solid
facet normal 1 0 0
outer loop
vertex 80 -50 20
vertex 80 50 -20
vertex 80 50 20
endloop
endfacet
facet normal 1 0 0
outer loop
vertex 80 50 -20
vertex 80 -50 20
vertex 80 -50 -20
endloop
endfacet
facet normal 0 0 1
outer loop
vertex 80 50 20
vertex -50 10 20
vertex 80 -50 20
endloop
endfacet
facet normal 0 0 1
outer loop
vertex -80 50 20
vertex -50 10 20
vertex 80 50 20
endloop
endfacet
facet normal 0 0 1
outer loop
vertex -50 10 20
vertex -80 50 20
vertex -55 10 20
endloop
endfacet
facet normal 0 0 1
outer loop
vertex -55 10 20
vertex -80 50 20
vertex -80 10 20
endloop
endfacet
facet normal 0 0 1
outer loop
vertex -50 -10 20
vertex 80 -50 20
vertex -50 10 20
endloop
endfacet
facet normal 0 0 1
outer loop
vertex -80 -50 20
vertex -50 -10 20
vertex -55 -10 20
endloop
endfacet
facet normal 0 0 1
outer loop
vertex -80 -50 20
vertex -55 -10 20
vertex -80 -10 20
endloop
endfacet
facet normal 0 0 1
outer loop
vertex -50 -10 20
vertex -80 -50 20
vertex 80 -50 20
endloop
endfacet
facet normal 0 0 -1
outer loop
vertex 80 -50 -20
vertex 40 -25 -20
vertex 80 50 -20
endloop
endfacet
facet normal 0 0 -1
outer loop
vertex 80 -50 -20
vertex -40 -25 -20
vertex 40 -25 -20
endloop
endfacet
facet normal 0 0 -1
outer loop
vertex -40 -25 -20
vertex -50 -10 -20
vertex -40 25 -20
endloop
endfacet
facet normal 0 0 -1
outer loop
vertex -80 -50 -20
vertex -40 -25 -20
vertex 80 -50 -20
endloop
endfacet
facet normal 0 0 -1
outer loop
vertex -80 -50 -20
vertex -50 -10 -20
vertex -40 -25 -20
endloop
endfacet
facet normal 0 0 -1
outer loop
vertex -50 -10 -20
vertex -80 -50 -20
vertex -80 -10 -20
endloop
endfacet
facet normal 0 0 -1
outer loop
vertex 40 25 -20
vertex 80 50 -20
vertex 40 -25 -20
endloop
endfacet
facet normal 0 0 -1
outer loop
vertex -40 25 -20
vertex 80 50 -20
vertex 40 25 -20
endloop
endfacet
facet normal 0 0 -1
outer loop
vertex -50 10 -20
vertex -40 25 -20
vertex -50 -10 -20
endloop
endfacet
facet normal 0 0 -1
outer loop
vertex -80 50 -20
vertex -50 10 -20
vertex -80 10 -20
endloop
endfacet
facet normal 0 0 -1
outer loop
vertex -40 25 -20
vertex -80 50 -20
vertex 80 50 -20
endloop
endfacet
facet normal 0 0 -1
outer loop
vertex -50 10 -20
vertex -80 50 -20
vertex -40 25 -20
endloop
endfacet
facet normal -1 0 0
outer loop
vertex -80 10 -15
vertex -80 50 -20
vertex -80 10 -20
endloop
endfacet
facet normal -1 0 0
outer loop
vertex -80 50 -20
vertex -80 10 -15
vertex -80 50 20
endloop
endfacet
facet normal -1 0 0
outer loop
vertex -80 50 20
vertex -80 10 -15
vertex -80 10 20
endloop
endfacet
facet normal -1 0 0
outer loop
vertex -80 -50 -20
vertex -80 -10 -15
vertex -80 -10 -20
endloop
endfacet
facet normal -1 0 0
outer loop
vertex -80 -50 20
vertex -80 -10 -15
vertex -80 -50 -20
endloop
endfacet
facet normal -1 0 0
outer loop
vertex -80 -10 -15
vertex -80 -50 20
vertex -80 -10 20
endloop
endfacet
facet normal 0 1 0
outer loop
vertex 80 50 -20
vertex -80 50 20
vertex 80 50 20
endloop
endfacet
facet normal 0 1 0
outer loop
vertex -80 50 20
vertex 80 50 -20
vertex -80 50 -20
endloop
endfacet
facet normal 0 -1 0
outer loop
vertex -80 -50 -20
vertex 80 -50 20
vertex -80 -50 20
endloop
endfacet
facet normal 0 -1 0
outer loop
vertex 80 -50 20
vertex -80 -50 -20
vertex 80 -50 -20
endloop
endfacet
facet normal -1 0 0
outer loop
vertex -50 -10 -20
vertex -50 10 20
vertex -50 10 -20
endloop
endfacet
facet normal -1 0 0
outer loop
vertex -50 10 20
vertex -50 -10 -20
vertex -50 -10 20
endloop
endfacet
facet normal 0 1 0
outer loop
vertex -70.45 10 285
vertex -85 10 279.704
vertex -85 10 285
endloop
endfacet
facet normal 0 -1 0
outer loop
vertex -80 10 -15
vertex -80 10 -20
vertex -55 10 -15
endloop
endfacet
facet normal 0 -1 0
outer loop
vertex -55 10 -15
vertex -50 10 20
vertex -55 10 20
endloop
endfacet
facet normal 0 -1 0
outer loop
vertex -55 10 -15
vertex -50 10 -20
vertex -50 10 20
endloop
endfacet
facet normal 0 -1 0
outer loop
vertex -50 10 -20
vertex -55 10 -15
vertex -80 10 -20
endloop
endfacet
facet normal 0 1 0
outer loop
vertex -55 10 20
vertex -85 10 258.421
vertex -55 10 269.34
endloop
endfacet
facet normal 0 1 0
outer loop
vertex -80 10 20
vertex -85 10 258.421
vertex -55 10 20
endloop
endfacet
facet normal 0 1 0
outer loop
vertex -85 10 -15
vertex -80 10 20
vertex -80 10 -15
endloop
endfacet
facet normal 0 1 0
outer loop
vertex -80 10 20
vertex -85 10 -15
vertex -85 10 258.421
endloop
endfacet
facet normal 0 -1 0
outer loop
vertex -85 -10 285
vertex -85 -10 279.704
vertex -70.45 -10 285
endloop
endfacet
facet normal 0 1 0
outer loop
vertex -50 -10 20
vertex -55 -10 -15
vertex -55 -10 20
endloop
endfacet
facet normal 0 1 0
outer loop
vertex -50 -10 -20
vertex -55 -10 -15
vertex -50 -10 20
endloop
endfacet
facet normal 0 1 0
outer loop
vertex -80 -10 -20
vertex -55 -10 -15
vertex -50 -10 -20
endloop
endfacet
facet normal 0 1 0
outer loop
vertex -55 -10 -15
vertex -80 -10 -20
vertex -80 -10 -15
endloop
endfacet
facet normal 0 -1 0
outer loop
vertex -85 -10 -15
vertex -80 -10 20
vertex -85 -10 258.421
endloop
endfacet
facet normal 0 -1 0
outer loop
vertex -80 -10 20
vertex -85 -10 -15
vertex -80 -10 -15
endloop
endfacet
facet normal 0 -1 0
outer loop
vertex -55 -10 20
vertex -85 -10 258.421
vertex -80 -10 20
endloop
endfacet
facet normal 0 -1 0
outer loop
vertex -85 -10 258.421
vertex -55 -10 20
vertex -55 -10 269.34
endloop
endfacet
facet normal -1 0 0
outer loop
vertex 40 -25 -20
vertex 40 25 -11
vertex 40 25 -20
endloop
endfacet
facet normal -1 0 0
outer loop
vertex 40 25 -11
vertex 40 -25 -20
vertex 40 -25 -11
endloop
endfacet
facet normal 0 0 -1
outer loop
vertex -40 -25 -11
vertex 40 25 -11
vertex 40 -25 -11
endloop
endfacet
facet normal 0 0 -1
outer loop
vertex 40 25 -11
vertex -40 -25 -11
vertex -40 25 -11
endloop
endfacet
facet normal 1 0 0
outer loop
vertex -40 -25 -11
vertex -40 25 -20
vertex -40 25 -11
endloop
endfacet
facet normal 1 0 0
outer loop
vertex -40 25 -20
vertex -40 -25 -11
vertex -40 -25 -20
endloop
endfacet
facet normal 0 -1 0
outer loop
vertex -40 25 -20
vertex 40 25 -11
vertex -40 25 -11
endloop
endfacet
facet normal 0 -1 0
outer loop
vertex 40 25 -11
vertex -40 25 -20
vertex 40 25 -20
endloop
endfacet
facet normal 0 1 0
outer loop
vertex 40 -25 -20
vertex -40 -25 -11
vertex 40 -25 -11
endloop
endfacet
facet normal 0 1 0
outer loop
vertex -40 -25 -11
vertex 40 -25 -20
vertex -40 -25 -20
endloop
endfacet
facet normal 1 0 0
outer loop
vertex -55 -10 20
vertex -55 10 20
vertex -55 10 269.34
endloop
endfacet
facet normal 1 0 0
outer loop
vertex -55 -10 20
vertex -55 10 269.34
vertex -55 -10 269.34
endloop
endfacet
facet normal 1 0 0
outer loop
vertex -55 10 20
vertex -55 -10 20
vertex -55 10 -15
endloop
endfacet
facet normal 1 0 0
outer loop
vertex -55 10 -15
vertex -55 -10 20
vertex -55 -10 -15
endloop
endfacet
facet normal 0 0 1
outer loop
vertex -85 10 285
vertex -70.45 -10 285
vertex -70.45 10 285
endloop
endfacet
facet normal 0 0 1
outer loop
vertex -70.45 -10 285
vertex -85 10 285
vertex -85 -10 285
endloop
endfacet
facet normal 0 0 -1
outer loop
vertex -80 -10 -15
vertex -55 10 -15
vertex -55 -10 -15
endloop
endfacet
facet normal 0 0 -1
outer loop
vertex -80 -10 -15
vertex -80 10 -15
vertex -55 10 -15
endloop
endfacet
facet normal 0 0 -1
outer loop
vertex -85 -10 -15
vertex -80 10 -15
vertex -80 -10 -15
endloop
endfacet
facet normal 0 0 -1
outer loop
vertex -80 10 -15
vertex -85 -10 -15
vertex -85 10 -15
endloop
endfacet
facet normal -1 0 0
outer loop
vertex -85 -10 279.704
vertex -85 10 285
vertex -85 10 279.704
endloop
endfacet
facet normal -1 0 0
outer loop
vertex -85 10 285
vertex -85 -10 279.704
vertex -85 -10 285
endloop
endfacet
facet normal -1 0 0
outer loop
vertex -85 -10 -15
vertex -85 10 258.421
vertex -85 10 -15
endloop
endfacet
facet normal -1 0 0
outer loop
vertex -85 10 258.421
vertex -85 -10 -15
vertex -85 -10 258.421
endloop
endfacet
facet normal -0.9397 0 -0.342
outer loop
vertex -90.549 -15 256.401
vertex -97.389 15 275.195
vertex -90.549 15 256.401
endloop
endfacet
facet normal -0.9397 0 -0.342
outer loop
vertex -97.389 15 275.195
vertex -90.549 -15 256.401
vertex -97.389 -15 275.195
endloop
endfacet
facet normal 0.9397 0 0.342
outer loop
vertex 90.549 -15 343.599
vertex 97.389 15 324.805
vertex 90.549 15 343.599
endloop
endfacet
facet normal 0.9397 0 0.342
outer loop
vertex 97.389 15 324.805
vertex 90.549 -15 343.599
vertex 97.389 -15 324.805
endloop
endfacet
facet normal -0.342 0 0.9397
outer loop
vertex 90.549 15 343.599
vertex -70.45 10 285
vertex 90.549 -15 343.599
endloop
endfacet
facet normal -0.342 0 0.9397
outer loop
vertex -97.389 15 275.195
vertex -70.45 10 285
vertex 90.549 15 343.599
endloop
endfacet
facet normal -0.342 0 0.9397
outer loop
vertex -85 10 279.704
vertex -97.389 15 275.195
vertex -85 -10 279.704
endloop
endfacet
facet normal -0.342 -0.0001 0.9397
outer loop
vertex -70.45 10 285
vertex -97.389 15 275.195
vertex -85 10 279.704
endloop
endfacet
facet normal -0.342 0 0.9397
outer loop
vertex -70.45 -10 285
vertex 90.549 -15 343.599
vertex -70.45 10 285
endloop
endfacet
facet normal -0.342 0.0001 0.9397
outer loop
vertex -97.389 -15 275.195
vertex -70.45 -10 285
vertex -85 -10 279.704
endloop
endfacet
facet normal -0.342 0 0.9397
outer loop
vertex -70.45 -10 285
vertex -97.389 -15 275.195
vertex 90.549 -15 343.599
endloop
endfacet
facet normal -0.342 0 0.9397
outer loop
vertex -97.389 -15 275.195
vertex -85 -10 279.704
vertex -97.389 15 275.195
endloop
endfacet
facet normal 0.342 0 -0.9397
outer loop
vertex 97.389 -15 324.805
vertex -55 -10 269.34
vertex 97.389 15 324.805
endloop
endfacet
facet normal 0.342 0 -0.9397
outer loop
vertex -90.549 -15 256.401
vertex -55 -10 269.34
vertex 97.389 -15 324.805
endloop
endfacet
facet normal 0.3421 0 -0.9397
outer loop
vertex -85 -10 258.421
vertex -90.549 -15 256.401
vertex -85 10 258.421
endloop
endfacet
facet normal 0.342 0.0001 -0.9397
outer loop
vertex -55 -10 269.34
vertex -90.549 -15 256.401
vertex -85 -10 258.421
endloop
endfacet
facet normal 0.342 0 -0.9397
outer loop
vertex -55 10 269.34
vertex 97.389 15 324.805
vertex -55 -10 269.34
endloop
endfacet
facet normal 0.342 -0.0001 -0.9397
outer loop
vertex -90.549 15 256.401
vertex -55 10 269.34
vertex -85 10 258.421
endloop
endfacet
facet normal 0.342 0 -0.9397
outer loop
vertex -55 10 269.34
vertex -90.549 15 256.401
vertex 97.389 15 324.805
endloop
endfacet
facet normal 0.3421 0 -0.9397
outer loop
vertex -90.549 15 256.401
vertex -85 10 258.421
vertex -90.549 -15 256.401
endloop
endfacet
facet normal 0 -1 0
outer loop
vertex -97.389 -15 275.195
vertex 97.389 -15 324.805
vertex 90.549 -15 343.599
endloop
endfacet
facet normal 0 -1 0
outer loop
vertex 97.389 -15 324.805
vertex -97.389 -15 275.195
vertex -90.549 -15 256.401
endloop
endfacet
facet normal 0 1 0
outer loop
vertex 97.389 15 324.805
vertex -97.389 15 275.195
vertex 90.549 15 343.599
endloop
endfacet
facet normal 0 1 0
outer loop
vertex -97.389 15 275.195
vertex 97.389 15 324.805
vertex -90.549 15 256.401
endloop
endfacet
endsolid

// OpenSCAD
// Generated by SolidPython 1.1.1 on 2021-04-14 21:12:52


union() {
	difference() {
		cube(center = true, size = [160, 100, 40]);
		translate(v = [-80.0000000000, 0, 0]) {
			cube(center = true, size = [60, 20, 41]);
		}
		translate(v = [0, 0, -21.0000000000]) {
			cube(center = true, size = [80, 50, 20]);
		}
	}
	translate(v = [0, 0, 135.0000000000]) {
		translate(v = [-70.0000000000, 0, 0]) {
			cube(center = true, size = [30, 20, 300]);
		}
	}
	translate(v = [0, 0, 300]) {
		rotate(a = [0, -20, 0]) {
			cube(center = true, size = [200, 30, 20]);
		}
	}
}
/***********************************************
*********      SolidPython code:      **********
************************************************
 
import solid
import solid.utils

BASE_DIMENSIONS = [
    160, # X value
    100, # Y value
    40   # Z value
]

POLE_DIMENSIONS = [
    30,
    20,
    300
]

TOP_DIMENSIONS = [
    200,
    30,
    20
]

BOTTOM_HOLE_DIMENSIONS = [
    80,
    50,
    20
]

def make_shade():
    pass

def make_top():
    top = solid.cube(TOP_DIMENSIONS, center=True)
    top = solid.utils.rotate([0, -20, 0])(top)
    top = solid.utils.up(
        POLE_DIMENSIONS[2]
    )(top)
    return top

def make_pole():
    pole = solid.cube(POLE_DIMENSIONS, center=True)
    pole = solid.utils.left((BASE_DIMENSIONS[0]/2) - 10)(pole)
    pole = solid.utils.up((((POLE_DIMENSIONS[2]/2) - BASE_DIMENSIONS[2]/2)) + 5)(pole)
    return pole

def make_base():
    base = solid.cube(BASE_DIMENSIONS, center=True)
    pole_hole = solid.cube([POLE_DIMENSIONS[0]*2, POLE_DIMENSIONS[1], BASE_DIMENSIONS[2]+1], center=True)
    pole_hole = solid.utils.left(BASE_DIMENSIONS[0]/2)(pole_hole)
    bottom_hole = solid.cube(BOTTOM_HOLE_DIMENSIONS, center=True)
    bottom_hole = solid.utils.down(BASE_DIMENSIONS[2]/2+1)(bottom_hole)
    return (base - pole_hole) - bottom_hole

def main():
    base = make_base()
    pole = make_pole()
    top = make_top()
    final_obj = base + pole + top
    solid.scad_render_to_file(final_obj, "model.scad")


if __name__ == "__main__":
    main() 
 
************************************************/
